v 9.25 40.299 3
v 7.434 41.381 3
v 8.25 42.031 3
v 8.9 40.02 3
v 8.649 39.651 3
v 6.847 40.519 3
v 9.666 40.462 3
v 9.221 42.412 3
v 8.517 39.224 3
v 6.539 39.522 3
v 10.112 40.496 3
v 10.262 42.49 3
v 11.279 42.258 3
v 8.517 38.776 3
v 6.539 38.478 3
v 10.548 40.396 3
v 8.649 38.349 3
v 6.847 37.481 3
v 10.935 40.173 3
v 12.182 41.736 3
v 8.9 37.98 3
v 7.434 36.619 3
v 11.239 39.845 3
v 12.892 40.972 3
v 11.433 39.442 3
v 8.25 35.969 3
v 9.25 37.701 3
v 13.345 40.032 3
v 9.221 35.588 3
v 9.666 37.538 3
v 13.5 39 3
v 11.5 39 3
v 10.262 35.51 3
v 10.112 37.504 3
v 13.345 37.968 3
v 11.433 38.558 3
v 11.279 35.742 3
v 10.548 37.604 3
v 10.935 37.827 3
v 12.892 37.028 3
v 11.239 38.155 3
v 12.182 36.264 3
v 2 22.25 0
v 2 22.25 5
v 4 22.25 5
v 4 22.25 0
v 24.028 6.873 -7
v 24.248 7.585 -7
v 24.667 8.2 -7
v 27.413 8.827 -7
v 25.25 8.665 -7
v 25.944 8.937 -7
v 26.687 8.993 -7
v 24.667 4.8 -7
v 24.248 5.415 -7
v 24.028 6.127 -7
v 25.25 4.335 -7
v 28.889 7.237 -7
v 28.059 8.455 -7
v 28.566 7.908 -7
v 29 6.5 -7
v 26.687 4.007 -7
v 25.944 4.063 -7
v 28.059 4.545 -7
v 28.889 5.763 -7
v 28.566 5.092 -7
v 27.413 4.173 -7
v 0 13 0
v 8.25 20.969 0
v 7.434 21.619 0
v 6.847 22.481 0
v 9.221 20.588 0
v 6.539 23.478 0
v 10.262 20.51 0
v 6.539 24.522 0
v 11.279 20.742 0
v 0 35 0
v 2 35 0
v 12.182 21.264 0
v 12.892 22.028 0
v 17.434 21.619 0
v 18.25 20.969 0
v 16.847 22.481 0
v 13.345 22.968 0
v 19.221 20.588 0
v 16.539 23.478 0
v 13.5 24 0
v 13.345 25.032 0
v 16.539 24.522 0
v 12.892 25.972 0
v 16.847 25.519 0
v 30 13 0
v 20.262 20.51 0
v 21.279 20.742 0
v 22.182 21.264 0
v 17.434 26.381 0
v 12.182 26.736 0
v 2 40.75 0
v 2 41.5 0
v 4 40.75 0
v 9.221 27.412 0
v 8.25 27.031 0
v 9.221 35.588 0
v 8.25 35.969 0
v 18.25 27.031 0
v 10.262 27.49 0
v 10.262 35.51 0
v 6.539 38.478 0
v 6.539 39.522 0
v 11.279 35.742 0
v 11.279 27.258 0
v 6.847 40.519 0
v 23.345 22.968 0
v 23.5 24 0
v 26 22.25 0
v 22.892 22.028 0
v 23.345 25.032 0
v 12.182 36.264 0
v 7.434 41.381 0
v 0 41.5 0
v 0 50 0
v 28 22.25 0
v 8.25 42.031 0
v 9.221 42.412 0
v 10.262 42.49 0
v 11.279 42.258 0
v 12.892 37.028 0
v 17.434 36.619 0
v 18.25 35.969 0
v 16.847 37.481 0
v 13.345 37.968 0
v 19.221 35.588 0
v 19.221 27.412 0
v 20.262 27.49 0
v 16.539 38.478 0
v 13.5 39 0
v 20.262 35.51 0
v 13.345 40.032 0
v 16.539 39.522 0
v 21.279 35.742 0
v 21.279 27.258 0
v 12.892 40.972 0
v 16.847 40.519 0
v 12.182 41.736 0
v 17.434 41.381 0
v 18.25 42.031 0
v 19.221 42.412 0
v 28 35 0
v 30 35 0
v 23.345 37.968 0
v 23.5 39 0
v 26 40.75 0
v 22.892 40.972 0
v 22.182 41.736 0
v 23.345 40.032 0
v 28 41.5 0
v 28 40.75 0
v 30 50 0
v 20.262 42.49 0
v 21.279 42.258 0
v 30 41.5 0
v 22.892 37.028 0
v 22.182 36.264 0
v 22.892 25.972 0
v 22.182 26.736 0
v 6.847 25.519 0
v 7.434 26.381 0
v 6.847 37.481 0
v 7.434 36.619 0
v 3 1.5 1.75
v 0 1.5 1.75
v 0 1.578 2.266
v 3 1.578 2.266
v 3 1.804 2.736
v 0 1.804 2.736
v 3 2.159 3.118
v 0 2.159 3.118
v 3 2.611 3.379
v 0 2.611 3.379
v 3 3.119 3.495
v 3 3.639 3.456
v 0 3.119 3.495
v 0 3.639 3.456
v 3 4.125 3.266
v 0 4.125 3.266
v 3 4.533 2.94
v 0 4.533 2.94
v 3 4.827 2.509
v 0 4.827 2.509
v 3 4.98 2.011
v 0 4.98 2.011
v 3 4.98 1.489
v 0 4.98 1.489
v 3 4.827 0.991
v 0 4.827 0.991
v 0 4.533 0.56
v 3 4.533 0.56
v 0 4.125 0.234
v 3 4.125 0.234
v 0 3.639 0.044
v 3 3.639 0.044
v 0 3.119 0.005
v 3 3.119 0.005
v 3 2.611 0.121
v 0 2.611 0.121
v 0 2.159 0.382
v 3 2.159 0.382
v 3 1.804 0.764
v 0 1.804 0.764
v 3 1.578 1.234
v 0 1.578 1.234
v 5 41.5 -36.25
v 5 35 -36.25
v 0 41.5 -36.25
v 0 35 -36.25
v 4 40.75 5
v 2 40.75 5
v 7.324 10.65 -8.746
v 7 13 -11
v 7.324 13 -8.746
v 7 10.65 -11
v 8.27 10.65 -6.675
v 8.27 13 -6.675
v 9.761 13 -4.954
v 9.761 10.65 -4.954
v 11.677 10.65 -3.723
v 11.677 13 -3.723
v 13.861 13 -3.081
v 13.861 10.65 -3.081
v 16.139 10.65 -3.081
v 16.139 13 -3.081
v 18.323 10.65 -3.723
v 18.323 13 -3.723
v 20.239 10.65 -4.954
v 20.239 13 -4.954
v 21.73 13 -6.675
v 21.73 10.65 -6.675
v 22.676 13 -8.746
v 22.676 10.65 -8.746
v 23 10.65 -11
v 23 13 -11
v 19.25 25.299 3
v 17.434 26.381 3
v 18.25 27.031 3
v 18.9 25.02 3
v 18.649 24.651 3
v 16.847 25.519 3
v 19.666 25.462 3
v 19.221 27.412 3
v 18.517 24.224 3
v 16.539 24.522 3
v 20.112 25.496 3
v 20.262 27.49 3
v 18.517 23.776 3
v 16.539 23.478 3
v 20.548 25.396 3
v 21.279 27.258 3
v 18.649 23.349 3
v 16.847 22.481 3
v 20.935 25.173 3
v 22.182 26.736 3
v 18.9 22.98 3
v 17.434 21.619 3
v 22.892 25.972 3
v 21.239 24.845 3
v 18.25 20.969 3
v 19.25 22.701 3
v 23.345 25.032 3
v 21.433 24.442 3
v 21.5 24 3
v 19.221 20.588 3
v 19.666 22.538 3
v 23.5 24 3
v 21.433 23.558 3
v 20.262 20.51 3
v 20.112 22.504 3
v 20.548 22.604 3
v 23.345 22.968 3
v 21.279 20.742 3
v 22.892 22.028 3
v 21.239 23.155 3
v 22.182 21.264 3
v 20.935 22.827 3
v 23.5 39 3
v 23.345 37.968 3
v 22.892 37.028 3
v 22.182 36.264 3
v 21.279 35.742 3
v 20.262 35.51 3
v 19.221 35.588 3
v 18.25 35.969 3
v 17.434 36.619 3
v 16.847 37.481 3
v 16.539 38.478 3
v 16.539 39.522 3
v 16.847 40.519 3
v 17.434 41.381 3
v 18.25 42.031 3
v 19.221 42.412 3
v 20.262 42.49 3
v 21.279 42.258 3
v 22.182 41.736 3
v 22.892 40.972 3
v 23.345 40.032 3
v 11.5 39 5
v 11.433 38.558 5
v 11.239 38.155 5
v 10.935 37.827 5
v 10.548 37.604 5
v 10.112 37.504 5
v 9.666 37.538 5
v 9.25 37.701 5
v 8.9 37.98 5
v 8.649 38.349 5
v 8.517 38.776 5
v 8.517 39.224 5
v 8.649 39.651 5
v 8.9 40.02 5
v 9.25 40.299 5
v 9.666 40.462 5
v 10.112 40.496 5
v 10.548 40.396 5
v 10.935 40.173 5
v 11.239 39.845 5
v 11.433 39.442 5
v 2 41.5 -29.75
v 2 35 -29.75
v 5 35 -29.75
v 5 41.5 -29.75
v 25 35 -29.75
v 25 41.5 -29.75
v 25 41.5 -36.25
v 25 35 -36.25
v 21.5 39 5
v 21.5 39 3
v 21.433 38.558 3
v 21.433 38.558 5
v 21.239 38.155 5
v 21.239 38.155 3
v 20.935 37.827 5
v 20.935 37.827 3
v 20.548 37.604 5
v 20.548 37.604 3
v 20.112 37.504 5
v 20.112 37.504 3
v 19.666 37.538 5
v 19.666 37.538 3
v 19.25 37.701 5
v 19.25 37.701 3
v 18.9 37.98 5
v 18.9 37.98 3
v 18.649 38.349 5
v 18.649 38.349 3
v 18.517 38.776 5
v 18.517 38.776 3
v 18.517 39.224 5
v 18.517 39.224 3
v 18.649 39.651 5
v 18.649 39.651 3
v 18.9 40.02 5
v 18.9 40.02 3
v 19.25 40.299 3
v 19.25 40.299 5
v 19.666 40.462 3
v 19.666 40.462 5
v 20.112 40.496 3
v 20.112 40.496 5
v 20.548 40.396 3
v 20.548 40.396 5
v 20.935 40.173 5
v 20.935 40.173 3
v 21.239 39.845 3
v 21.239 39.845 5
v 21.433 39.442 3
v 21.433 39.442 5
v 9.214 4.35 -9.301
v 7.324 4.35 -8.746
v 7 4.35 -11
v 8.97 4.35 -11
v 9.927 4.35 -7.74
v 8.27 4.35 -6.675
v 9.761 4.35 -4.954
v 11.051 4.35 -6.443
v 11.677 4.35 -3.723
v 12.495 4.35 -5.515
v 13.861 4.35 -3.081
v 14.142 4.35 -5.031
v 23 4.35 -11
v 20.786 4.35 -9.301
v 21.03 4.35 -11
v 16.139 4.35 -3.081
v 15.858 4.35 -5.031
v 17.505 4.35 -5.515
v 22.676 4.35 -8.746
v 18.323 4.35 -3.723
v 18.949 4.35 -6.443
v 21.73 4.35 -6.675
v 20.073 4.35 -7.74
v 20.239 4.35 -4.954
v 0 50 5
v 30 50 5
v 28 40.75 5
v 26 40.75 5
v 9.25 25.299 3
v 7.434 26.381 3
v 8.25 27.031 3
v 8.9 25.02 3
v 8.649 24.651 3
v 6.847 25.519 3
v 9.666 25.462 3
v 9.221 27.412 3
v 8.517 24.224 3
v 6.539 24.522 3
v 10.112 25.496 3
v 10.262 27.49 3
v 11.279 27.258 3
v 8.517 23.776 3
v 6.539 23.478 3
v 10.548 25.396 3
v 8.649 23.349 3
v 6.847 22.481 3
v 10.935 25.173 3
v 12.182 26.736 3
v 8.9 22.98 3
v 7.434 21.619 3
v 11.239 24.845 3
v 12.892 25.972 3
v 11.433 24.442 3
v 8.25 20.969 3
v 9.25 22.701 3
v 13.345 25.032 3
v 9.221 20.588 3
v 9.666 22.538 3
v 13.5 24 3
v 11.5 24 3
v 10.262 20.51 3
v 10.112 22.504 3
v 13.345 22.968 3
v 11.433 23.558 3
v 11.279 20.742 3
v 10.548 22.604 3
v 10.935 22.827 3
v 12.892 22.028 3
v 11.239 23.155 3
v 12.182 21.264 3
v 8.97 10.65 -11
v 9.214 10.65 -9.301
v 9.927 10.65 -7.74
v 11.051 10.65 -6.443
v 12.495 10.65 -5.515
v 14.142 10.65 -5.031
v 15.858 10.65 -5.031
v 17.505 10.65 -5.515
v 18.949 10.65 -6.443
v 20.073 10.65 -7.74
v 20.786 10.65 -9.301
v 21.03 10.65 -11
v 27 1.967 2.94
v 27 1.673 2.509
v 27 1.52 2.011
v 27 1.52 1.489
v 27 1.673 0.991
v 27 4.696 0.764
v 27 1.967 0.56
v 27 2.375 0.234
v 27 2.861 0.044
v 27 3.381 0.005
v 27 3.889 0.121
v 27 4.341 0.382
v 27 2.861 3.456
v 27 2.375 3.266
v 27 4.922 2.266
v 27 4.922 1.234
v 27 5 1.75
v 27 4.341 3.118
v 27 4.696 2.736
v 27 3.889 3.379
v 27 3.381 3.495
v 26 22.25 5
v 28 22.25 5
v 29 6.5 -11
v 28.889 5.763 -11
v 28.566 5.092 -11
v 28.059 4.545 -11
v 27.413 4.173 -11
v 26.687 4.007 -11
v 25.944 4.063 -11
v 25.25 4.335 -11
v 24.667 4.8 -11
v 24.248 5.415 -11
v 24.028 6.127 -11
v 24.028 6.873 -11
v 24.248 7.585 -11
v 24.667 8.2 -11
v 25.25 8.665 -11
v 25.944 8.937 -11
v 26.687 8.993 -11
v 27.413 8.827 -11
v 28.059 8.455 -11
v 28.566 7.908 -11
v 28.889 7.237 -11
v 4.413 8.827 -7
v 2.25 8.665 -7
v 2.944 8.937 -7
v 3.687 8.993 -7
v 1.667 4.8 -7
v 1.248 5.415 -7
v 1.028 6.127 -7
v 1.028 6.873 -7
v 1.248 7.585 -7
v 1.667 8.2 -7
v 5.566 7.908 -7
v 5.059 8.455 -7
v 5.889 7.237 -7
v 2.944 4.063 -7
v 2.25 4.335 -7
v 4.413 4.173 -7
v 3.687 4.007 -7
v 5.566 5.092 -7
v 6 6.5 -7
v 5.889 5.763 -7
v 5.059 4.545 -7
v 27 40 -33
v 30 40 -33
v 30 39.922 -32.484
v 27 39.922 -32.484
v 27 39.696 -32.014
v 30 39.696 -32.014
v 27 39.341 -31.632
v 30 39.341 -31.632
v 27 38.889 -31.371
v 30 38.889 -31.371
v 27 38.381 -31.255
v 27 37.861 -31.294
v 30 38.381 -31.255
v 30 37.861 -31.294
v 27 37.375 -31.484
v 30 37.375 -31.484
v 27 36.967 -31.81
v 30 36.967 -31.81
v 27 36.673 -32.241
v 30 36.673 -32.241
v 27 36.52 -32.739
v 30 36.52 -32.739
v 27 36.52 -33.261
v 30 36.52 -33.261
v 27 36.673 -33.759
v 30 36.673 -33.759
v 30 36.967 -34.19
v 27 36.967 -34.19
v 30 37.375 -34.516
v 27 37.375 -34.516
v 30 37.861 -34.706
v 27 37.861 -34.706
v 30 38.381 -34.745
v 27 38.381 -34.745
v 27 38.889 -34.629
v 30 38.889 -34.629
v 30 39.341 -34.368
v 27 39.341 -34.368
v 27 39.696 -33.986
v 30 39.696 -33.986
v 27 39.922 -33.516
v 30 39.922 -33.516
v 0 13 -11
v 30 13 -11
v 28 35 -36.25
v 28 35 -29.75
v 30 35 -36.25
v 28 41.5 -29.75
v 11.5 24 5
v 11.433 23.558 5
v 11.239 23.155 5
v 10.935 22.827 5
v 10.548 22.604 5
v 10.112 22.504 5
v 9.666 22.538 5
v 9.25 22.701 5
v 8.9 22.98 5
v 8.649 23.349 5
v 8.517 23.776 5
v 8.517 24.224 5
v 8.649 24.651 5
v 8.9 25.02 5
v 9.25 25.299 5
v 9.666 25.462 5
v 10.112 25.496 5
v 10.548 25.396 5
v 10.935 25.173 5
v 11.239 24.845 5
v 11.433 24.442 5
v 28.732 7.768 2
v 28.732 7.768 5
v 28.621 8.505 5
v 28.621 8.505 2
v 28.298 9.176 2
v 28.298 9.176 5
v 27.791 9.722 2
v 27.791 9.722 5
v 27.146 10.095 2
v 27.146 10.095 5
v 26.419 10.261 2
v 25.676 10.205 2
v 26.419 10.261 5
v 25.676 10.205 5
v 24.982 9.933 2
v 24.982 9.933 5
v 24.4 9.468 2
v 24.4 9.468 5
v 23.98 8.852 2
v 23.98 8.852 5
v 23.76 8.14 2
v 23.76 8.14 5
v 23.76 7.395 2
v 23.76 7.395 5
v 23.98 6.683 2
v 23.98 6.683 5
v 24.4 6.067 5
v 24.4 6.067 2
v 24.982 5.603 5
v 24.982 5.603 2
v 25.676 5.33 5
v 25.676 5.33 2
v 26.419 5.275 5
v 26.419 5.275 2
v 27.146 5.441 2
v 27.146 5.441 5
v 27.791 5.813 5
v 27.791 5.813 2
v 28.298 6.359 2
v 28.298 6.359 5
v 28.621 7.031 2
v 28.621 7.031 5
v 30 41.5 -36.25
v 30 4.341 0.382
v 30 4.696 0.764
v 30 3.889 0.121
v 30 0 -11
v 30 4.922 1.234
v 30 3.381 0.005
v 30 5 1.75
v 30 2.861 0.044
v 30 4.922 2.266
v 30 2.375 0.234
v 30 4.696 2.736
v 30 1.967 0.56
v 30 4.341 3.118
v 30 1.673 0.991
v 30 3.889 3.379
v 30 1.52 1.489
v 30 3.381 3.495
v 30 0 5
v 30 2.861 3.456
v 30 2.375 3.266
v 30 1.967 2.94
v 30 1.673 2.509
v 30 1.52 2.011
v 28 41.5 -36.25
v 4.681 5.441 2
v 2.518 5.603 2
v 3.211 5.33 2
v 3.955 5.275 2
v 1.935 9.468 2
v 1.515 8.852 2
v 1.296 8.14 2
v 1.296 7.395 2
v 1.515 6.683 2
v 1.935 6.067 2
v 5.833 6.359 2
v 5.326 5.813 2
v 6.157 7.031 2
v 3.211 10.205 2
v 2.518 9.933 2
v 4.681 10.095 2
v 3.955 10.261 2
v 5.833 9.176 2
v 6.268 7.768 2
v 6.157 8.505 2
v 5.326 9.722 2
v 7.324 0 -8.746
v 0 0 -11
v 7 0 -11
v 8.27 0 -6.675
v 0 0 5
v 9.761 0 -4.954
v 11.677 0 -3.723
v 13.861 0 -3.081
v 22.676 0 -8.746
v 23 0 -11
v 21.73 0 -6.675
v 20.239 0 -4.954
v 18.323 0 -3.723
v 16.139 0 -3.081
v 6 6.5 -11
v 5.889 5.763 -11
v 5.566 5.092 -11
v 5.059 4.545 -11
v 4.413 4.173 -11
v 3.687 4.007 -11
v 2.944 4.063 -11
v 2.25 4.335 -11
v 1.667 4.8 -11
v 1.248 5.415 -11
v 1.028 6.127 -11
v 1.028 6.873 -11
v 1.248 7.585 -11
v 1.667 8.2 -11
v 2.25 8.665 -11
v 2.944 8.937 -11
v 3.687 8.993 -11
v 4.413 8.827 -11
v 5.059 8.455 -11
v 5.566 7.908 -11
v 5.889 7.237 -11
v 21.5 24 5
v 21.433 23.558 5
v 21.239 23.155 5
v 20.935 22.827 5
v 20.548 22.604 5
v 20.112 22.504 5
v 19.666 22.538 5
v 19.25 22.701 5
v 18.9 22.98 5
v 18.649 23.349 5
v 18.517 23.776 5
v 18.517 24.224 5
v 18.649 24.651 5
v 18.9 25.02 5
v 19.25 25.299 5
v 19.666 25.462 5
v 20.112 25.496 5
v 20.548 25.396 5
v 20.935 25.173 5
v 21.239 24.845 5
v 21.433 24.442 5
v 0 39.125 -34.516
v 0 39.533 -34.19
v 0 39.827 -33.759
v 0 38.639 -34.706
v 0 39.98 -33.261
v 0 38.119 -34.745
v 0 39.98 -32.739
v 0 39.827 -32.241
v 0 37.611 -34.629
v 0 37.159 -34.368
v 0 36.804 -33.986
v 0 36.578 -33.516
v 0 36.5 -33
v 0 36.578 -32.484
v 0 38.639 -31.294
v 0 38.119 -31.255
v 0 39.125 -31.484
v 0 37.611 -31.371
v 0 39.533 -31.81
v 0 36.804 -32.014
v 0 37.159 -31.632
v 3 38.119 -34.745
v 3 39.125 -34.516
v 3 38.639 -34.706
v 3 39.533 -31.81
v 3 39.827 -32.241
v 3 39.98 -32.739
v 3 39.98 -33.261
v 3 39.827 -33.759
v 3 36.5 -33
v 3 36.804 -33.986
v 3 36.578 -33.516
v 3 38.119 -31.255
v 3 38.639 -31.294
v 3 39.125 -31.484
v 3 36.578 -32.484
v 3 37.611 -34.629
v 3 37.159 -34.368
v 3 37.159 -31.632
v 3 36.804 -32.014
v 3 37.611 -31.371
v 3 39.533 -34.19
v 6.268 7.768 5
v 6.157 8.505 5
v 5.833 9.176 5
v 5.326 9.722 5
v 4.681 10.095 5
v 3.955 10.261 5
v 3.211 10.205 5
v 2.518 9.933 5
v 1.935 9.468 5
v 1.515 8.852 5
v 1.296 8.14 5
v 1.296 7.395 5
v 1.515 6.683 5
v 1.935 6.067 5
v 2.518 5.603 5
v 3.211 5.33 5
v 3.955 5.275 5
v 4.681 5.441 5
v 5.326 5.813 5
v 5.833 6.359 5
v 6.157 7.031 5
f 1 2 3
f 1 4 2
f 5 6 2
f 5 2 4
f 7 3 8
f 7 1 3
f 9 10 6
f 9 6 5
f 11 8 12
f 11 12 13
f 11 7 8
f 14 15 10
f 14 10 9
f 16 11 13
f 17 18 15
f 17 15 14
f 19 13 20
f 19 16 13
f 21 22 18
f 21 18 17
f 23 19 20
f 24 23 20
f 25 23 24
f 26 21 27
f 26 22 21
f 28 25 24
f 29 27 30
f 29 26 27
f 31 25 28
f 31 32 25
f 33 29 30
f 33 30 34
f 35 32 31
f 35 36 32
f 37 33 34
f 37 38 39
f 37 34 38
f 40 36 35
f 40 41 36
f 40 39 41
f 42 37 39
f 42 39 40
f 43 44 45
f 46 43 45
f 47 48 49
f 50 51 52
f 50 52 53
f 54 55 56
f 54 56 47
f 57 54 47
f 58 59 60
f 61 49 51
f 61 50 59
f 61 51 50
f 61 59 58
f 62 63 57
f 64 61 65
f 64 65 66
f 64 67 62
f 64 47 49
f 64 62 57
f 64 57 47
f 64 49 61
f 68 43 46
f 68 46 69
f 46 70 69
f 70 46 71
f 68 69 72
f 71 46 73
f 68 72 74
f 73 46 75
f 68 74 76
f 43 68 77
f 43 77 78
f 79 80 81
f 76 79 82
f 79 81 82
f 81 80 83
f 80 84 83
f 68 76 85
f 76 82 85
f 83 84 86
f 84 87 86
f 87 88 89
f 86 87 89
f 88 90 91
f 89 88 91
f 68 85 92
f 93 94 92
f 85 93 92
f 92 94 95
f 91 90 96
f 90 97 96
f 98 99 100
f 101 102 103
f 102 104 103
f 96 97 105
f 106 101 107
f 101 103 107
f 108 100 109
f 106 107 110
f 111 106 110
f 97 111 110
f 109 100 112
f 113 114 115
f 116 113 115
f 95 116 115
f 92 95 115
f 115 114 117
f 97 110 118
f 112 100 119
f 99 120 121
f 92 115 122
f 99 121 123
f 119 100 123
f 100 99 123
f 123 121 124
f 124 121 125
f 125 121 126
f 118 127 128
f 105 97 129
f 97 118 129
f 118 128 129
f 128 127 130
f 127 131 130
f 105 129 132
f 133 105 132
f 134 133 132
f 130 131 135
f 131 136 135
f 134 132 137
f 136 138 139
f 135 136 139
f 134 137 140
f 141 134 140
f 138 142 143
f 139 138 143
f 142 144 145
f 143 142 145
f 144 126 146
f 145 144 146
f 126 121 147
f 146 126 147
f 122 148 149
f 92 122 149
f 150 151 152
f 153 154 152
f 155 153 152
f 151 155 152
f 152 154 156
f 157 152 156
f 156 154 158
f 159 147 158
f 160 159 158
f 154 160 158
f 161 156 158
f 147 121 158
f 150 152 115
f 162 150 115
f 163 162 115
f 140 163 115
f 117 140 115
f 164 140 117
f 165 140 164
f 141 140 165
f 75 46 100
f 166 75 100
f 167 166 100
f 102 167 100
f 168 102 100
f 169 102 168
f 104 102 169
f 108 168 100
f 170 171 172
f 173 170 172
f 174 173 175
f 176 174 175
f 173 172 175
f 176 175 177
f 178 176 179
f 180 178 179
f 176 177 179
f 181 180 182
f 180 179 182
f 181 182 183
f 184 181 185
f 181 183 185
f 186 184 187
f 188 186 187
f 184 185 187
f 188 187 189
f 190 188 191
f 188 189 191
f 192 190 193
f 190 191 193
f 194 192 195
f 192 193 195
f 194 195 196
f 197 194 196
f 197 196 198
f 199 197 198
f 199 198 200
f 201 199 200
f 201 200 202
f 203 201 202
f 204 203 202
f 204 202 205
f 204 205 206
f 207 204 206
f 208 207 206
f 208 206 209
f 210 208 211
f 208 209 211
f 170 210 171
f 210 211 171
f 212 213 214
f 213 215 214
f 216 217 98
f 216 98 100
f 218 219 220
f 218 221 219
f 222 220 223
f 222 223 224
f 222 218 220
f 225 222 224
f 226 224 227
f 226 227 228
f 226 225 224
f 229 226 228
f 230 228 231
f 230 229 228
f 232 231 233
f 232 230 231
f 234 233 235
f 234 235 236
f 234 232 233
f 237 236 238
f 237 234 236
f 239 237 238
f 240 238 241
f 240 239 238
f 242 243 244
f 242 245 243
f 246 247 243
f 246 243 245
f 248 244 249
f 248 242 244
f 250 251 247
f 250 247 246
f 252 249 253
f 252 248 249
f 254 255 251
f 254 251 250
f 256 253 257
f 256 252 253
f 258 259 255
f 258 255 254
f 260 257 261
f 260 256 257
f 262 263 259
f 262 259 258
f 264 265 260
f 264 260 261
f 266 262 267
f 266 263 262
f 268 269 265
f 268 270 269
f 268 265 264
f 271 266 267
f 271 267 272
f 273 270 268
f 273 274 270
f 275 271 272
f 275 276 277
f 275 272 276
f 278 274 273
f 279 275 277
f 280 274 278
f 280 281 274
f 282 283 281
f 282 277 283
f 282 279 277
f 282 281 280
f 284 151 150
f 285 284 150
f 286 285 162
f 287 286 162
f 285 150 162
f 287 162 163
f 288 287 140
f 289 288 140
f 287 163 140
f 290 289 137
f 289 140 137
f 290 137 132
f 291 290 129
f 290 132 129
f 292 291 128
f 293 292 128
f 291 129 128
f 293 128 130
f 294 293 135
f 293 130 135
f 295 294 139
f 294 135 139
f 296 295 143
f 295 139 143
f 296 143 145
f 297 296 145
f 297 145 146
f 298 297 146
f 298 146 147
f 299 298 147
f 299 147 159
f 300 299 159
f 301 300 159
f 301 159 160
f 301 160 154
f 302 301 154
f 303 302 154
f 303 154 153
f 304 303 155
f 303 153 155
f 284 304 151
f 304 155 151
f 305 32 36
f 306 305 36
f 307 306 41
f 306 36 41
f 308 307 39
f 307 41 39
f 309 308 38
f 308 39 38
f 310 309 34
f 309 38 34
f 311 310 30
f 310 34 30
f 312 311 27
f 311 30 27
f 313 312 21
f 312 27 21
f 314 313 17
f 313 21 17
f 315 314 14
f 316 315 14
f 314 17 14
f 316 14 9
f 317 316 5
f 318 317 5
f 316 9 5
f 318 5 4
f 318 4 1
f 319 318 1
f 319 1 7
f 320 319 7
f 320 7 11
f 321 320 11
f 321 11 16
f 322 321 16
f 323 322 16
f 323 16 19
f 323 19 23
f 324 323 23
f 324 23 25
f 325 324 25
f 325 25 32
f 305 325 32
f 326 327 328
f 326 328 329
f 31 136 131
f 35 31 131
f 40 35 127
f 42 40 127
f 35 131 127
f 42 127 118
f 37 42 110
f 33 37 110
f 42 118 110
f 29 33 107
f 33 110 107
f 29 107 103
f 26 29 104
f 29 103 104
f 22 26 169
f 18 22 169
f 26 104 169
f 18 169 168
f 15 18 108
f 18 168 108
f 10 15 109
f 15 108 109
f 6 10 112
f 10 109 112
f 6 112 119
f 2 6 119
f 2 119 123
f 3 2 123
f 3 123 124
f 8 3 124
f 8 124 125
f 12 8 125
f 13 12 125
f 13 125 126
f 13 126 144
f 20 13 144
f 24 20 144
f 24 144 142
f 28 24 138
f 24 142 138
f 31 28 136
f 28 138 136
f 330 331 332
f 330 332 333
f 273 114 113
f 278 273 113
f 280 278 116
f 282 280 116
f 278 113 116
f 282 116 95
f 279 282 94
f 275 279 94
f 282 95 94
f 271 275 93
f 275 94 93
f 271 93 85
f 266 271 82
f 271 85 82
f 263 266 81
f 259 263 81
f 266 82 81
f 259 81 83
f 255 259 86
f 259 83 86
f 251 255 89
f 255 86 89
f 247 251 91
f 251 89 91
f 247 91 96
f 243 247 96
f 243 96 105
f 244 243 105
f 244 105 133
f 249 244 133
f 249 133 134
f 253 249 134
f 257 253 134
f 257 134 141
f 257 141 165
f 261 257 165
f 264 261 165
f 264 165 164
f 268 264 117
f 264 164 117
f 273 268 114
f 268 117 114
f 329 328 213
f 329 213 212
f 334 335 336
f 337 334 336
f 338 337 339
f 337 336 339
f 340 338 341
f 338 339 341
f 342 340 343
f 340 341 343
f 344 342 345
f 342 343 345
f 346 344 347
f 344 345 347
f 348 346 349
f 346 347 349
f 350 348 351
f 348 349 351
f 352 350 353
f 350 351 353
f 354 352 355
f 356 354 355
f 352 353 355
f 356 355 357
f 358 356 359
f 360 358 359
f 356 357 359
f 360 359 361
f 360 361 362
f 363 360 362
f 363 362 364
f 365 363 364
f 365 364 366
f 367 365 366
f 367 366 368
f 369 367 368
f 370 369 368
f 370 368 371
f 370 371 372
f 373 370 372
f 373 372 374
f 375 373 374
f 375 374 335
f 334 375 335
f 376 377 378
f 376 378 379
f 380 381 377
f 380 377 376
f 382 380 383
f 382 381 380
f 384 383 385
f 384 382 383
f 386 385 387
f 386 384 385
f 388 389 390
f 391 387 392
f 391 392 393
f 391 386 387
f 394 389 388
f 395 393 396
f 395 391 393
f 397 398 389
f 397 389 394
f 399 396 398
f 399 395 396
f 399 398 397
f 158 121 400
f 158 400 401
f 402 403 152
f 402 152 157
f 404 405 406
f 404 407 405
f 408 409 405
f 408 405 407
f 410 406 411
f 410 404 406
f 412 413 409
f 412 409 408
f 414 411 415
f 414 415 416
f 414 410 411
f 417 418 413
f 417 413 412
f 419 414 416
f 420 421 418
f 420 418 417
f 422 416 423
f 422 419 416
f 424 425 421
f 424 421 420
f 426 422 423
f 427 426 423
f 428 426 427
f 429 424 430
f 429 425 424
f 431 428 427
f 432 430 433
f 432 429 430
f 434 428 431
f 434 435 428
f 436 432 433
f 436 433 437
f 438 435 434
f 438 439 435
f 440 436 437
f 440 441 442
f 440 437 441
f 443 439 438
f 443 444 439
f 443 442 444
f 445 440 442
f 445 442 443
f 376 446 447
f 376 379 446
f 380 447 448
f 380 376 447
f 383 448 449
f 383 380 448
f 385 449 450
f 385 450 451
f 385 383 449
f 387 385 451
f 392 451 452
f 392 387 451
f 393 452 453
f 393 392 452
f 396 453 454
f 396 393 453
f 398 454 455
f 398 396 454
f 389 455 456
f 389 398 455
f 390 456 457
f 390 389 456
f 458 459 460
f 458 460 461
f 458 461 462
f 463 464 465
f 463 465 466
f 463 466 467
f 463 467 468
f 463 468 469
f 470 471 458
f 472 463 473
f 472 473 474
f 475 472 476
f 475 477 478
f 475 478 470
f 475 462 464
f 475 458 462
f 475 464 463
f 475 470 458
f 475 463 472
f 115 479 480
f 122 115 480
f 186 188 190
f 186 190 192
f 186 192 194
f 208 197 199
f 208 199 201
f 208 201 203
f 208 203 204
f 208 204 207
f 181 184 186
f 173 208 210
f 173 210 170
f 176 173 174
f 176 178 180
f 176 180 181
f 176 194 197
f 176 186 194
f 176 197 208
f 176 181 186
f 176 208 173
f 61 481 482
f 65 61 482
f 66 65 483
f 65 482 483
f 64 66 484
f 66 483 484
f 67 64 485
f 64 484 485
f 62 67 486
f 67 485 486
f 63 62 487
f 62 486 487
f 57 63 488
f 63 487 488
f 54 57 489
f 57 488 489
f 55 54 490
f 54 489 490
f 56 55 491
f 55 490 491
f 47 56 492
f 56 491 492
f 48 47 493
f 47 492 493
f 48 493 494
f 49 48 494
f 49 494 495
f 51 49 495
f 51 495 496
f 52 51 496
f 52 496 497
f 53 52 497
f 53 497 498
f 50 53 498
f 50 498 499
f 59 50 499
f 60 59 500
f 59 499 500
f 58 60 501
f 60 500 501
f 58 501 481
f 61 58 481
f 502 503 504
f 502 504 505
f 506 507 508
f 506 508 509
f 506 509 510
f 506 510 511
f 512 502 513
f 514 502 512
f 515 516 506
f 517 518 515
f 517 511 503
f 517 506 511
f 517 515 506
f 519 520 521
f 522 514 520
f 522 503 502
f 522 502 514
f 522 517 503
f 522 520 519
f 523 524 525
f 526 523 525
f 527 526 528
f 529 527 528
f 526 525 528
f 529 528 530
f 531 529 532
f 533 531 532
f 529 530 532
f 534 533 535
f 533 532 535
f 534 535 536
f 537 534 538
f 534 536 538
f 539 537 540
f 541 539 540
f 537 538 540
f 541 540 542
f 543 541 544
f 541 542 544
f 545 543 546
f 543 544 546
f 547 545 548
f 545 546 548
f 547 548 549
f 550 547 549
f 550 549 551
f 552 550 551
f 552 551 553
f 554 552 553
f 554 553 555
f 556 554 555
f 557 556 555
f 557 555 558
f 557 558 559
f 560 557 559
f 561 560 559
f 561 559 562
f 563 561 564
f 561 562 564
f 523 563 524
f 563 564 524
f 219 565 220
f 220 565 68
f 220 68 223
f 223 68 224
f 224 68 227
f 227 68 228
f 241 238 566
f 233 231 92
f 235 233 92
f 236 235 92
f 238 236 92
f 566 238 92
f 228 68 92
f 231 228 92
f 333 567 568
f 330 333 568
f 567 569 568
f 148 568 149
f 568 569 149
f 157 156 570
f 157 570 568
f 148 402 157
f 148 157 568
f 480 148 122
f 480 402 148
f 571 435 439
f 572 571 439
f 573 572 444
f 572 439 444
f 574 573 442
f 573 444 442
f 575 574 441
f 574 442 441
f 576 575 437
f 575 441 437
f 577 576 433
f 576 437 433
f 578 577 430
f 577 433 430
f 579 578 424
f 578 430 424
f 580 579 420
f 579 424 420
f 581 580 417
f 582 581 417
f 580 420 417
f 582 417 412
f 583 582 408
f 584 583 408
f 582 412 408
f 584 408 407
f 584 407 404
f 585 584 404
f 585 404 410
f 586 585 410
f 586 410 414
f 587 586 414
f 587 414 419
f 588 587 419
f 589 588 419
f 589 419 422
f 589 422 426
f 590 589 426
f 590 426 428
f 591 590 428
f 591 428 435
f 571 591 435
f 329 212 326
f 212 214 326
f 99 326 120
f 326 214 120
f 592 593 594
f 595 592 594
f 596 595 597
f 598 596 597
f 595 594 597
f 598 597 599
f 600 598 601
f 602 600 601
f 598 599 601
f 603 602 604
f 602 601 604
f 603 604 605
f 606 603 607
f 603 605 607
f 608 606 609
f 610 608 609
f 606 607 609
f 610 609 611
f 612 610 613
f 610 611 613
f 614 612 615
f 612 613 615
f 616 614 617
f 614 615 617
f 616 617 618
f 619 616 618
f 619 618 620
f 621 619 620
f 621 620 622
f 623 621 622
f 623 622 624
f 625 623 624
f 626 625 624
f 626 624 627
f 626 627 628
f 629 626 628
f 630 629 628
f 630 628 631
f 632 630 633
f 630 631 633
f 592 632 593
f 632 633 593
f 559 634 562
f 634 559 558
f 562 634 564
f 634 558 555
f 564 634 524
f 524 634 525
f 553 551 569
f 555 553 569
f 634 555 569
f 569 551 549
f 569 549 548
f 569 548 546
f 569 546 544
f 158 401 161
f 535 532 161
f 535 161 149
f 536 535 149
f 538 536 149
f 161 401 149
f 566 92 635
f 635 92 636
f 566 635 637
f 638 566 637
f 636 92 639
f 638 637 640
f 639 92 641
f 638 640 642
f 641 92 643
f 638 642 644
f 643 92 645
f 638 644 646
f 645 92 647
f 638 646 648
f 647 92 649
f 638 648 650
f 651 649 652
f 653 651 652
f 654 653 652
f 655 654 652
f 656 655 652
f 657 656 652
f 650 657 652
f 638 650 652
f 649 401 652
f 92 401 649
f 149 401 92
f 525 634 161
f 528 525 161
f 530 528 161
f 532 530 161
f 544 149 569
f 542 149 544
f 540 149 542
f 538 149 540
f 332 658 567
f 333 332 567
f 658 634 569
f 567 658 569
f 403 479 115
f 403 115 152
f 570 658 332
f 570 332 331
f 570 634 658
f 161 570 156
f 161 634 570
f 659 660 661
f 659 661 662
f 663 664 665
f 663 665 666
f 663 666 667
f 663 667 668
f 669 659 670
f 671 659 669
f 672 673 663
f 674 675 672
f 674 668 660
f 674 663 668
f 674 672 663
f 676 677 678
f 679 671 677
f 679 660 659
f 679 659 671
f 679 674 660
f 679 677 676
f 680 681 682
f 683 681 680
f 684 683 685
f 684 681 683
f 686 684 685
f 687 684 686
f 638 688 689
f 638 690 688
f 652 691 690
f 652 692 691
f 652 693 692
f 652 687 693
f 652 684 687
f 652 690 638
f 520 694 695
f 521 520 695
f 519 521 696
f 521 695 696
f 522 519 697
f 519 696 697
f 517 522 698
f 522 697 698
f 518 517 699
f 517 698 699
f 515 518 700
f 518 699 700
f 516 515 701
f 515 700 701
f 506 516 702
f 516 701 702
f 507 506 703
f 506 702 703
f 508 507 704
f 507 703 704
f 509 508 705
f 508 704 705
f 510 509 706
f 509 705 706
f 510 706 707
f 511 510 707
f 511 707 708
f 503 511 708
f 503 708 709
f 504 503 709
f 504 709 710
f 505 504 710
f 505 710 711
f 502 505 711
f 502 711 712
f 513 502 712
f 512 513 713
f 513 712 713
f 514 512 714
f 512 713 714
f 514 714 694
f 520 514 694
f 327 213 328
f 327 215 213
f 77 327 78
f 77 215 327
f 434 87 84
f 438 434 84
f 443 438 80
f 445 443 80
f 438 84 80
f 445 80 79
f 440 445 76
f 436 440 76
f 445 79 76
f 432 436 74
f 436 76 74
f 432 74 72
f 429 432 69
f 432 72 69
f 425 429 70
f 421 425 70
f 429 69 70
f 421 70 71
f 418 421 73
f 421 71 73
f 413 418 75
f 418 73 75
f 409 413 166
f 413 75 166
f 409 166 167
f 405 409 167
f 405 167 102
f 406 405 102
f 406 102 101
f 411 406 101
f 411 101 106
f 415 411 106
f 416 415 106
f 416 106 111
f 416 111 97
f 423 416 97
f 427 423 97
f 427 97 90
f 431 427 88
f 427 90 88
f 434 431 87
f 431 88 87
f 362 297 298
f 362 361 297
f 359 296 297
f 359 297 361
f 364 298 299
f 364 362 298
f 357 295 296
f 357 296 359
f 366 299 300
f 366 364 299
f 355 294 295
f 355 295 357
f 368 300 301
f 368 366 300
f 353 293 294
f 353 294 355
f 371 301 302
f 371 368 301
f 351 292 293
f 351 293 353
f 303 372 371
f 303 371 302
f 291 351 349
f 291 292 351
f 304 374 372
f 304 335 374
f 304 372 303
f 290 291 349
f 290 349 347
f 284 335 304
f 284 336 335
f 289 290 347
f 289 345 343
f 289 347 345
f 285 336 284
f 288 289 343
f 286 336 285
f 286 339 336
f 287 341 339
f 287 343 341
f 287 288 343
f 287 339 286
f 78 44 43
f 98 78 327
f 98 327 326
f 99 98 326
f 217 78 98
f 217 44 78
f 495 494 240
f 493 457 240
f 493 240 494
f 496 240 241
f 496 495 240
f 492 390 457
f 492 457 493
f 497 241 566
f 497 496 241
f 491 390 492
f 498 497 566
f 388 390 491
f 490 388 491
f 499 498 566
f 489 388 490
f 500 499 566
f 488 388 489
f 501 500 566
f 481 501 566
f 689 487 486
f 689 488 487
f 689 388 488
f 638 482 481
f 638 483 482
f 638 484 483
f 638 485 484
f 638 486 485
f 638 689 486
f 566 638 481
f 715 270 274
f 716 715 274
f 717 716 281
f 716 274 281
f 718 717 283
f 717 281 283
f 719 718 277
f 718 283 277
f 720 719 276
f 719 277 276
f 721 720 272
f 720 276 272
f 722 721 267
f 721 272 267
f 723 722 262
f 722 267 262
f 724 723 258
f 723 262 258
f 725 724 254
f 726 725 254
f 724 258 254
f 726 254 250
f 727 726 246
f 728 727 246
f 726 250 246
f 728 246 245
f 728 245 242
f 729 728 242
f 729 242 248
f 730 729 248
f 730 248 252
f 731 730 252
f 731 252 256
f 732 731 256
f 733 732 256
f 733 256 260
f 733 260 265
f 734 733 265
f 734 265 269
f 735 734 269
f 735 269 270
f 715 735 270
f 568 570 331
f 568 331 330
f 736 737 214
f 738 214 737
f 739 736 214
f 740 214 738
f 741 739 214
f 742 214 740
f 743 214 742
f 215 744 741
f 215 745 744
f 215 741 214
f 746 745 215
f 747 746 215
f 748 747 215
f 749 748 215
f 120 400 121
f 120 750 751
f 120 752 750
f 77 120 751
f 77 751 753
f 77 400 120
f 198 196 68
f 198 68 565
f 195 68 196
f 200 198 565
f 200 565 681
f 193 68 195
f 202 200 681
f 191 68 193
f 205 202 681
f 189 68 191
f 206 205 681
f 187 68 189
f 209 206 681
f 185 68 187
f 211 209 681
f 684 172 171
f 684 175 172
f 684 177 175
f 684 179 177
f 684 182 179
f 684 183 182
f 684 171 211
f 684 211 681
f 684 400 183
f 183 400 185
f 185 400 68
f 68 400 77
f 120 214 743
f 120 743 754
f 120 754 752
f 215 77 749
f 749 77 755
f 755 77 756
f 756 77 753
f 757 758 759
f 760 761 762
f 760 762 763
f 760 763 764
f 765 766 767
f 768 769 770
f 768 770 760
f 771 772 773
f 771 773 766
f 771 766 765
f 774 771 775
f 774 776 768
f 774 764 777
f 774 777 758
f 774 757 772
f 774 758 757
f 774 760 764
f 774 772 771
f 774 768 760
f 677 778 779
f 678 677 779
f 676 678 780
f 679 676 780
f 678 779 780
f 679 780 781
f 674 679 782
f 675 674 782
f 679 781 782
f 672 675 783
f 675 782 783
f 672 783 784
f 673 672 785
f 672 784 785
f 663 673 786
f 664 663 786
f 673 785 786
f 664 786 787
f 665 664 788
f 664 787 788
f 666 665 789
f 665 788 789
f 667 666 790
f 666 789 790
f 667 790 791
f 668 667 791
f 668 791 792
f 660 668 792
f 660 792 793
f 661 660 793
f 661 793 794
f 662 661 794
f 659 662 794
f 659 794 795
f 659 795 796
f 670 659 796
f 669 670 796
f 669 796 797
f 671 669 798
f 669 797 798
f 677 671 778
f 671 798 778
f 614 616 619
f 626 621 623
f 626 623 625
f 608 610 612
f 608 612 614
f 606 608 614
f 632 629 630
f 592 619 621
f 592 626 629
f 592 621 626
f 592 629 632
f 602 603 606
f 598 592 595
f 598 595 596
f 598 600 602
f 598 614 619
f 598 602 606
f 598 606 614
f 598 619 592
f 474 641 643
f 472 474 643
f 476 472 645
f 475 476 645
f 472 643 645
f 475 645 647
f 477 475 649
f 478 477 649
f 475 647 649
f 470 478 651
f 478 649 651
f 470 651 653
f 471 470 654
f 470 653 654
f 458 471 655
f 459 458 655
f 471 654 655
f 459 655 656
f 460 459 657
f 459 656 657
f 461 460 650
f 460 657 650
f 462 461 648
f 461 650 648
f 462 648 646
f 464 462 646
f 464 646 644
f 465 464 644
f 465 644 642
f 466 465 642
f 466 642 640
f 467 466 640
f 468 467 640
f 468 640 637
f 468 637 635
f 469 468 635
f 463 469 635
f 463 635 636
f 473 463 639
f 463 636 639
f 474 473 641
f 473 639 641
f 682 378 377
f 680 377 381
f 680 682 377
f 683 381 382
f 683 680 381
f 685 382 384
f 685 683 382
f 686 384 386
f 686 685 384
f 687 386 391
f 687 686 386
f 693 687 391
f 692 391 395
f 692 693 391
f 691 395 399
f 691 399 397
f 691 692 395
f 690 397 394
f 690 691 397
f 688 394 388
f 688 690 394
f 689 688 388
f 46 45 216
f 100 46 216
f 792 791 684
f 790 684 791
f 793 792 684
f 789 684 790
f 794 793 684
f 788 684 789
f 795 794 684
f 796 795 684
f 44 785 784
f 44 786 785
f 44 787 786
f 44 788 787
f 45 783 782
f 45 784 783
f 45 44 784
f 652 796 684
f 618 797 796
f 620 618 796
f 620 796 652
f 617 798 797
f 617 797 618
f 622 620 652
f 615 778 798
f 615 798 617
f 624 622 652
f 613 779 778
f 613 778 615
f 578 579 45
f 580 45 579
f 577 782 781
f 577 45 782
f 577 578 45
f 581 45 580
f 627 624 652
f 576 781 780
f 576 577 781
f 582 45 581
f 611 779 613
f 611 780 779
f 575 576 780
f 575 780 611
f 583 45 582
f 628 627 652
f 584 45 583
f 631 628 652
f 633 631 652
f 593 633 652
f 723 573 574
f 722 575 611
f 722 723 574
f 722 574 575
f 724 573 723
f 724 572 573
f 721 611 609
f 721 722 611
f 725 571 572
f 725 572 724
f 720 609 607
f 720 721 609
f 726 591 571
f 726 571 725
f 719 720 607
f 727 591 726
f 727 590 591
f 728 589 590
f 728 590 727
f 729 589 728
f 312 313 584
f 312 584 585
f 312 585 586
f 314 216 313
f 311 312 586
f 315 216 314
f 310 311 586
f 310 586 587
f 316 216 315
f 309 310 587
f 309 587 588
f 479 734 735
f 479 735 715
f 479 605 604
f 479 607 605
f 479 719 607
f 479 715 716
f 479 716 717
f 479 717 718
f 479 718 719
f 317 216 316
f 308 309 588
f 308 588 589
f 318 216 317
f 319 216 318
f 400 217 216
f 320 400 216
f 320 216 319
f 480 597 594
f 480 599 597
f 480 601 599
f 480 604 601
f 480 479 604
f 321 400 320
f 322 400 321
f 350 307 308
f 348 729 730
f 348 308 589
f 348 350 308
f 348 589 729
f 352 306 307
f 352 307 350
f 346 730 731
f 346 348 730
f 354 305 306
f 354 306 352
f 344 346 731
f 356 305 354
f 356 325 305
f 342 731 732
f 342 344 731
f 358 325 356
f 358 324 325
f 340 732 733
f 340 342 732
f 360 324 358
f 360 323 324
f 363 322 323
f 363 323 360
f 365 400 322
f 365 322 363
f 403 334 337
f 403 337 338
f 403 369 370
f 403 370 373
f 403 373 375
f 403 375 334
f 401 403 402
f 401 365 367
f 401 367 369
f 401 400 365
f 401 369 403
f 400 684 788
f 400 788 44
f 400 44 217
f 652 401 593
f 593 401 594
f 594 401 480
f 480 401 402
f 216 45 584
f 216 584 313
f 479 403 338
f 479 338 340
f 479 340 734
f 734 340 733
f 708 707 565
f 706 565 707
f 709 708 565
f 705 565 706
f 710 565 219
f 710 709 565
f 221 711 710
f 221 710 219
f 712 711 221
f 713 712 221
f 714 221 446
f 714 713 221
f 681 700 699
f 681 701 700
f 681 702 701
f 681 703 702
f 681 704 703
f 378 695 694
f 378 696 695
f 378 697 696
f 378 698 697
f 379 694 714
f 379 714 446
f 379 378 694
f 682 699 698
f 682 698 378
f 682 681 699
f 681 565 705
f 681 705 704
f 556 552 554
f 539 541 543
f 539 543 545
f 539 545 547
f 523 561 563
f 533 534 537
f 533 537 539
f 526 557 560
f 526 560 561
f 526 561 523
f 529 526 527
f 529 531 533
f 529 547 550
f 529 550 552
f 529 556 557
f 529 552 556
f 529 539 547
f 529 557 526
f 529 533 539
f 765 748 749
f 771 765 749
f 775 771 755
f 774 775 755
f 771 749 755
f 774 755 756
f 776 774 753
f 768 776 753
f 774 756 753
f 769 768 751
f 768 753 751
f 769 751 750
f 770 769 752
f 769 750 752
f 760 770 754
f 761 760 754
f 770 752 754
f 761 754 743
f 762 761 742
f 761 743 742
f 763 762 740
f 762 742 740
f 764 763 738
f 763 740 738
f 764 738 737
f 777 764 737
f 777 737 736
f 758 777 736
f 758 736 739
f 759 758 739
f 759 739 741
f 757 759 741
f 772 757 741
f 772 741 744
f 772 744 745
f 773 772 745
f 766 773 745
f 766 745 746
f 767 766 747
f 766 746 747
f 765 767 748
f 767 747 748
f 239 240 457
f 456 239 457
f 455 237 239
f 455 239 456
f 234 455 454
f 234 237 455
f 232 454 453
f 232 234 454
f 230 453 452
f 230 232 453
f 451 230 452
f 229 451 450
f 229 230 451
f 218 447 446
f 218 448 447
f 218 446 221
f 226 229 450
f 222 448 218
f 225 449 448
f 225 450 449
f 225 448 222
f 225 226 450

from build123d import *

# Parameters (mm, degrees)
SKETCH_W        = 30
SKETCH_H        = 50
PAD_DEPTH       = 5
SKETCH002_W     = 30
SKETCH002_H     = 13
PAD001_DEPTH    = 11
GROOVE_ANGLE    = 180
SKETCH004_R     = 2.5
POCKET_DEPTH    = 4
SKETCH005_R     = 1.5
POCKET001_DEPTH = 5
SKETCH006_R     = 3.5
POCKET002_DEPTH = 3
SKETCH008_R     = 1.75
POCKET003_DEPTH = 3
SKETCH009_W     = 2
SKETCH009_H     = 6.5
PAD002_DEPTH    = 36.25
SKETCH010_W     = 6.5
SKETCH010_H     = 6.5
PAD003_DEPTH    = 3
SKETCH011_R     = 1.75
POCKET004_DEPTH = 3
SKETCH012_W     = 2
SKETCH012_H     = 6.5000000001
PAD004_DEPTH    = 36.25
SKETCH013_W     = 6.5
SKETCH013_H     = 6.5
PAD005_DEPTH    = 3
SKETCH014_R     = 1.75
POCKET005_DEPTH = 3
SKETCH015_W     = 2
SKETCH015_H     = 18.5
POCKET006_DEPTH = 5
SKETCH034_R     = 2.5
POCKET013_DEPTH = 3


with BuildPart() as part:
    # Sketch → Pad (new body)
    with BuildSketch(Plane.XY):
        with Locations((15, 25)):
            Rectangle(SKETCH_W, SKETCH_H)
    extrude(amount=PAD_DEPTH)

    # Sketch002 (on Face5 of Pad) → Pad001 (join)
    with BuildSketch(Plane(origin=(0, 0, 0), x_dir=(1, 0, 0), z_dir=(0, 0, -1))):
        with Locations((15, -6.5)):
            Rectangle(SKETCH002_W, SKETCH002_H)
    extrude(amount=PAD001_DEPTH)

    # Sketch003 (on Face10 of Pad001) → Groove (revolve, cut)
    with BuildSketch(Plane(origin=(0, 0, -11), x_dir=(1, 0, 0), z_dir=(0, 0, -1))):
        Polygon((7, -13), (7, -10.65), (8.97, -10.65), (8.97, -4.35), (7, -4.35), (7, 1), (15, 1), (15, -13), align=None)
    revolve(axis=Axis((15, -1, -11), (0, 1, 0)), revolution_arc=GROOVE_ANGLE, mode=Mode.SUBTRACT)

    # Sketch004 (on Face10 of Groove) → Pocket (cut)
    with BuildSketch(Plane(origin=(0, 0, -11), x_dir=(1, 0, 0), z_dir=(0, 0, -1))):
        with Locations((3.5, -6.5)):
            Circle(SKETCH004_R)
        with Locations((26.5, -6.5)):
            Circle(SKETCH004_R)
    extrude(amount=-POCKET_DEPTH, mode=Mode.SUBTRACT)

    # Sketch005 (on Face7 of Pocket) → Pocket001 (cut)
    with BuildSketch(Plane(origin=(0, 0, 0), x_dir=(1, 0, 0), z_dir=(0, 0, -1))):
        with Locations((10, -24)):
            Circle(SKETCH005_R)
        with Locations((20, -24)):
            Circle(SKETCH005_R)
        with Locations((10, -39)):
            Circle(SKETCH005_R)
        with Locations((20, -39)):
            Circle(SKETCH005_R)
    extrude(amount=-POCKET001_DEPTH, mode=Mode.SUBTRACT)

    # Sketch006 (on Face7 of Pocket001) → Pocket002 (cut)
    with BuildSketch(Plane(origin=(0, 0, 0), x_dir=(1, 0, 0), z_dir=(0, 0, -1))):
        with Locations((10, -39)):
            Circle(SKETCH006_R)
        with Locations((10, -24)):
            Circle(SKETCH006_R)
        with Locations((20, -24)):
            Circle(SKETCH006_R)
        with Locations((20, -39)):
            Circle(SKETCH006_R)
    extrude(amount=-POCKET002_DEPTH, mode=Mode.SUBTRACT)

    # Sketch008 (on Face8 of Pocket002) → Pocket003 (cut)
    with BuildSketch(Plane(origin=(0, 0, 0), x_dir=(0, -1, 0), z_dir=(-1, 0, 0))):
        with Locations((-3.25, 1.75)):
            Circle(SKETCH008_R)
    extrude(amount=-POCKET003_DEPTH, mode=Mode.SUBTRACT)

    # Sketch009 (on Face6 of Pocket003) → Pad002 (join)
    with BuildSketch(Plane(origin=(0, 0, 0), x_dir=(1, 0, 0), z_dir=(0, 0, -1))):
        with Locations((1, -38.25)):
            Rectangle(SKETCH009_W, SKETCH009_H)
    extrude(amount=PAD002_DEPTH)

    # Sketch010 (on Face21 of Pad002) → Pad003 (join)
    with BuildSketch(Plane.YZ.offset(2)):
        with Locations((38.25, -33)):
            Rectangle(SKETCH010_W, SKETCH010_H)
    extrude(amount=PAD003_DEPTH)

    # Sketch011 (on Face7 of Pad003) → Pocket004 (cut)
    with BuildSketch(Plane(origin=(0, 0, 0), x_dir=(0, -1, 0), z_dir=(-1, 0, 0))):
        with Locations((-38.25, -33)):
            Circle(SKETCH011_R)
    extrude(amount=-POCKET004_DEPTH, mode=Mode.SUBTRACT)

    # Sketch012 (on Face6 of Pocket004) → Pad004 (join)
    with BuildSketch(Plane(origin=(0, 0, 0), x_dir=(1, 0, 0), z_dir=(0, 0, -1))):
        with Locations((29, -38.25)):
            Rectangle(SKETCH012_W, SKETCH012_H)
    extrude(amount=PAD004_DEPTH)

    # Sketch013 (on Face21 of Pad004) → Pad005 (join)
    with BuildSketch(Plane(origin=(28, 0, 0), x_dir=(0, -1, 0), z_dir=(-1, 0, 0))):
        with Locations((-38.25, -33)):
            Rectangle(SKETCH013_W, SKETCH013_H)
    extrude(amount=PAD005_DEPTH)

    # Sketch014 (on Face12 of Pad005) → Pocket005 (cut)
    with BuildSketch(Plane.YZ.offset(30)):
        with Locations((38.25, -33)):
            Circle(SKETCH014_R)
        with Locations((3.25, 1.75)):
            Circle(SKETCH014_R)
    extrude(amount=-POCKET005_DEPTH, mode=Mode.SUBTRACT)

    # Sketch015 (on Face5 of Pocket005) → Pocket006 (cut)
    with BuildSketch(Plane.XY.offset(5)):
        with Locations((3, 31.5)):
            Rectangle(SKETCH015_W, SKETCH015_H)
        with Locations((27, 31.5)):
            Rectangle(SKETCH015_W, SKETCH015_H)
    extrude(amount=-POCKET006_DEPTH, mode=Mode.SUBTRACT)

    # Sketch034 (on Face5 of Pocket006) → Pocket013 (cut)
    with BuildSketch(Plane.XY.offset(5)):
        with Locations((3.767766953, 7.767766953)):
            Circle(SKETCH034_R)
        with Locations((26.232233047, 7.767766953)):
            Circle(SKETCH034_R)
    extrude(amount=-POCKET013_DEPTH, mode=Mode.SUBTRACT)


solid = part.part
